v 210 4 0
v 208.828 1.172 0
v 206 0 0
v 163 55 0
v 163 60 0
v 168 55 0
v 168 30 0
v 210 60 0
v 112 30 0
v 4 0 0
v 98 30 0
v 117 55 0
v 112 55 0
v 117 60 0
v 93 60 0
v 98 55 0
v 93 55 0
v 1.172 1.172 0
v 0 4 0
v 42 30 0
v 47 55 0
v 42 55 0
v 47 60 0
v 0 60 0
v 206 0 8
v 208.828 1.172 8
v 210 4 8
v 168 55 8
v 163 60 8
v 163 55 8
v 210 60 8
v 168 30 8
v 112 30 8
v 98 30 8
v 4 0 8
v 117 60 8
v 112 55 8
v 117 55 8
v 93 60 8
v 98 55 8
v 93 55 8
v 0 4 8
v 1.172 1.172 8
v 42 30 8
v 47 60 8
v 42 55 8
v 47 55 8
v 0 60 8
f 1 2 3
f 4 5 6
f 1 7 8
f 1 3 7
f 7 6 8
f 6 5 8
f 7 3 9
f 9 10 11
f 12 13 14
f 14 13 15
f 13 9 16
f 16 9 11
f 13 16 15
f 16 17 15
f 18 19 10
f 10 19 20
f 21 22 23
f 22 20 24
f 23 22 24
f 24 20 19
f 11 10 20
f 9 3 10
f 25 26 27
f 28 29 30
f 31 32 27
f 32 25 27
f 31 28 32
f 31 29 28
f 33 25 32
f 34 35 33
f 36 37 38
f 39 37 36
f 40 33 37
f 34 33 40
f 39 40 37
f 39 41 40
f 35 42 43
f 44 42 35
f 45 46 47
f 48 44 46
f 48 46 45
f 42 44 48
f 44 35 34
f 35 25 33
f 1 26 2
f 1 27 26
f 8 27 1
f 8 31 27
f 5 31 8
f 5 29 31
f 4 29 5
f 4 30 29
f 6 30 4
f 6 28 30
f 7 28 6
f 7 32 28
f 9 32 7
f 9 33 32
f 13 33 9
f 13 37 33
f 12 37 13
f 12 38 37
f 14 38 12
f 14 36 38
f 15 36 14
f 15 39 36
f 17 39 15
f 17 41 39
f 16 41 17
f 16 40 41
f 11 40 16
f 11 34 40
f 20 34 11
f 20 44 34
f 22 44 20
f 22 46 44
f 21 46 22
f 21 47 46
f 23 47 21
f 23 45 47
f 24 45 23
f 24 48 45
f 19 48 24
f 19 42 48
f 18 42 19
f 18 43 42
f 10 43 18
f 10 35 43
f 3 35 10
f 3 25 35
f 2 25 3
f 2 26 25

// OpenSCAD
$fn = 32;

// ----------------------------------------------------------------------
// Oversize slot bar: 210 mm bar with 2 oversize windows
// ----------------------------------------------------------------------

// --- parameters (mm) ---
profile_height = 8;       // extrusion height
profile_points = 24;      // points of the closed outline

profile = [[0, 4], [1.172, 1.172], [4, 0], [206, 0], [208.828, 1.172], [210, 4], [210, 60], [163, 60], [163, 55], [168, 55], [168, 30], [112, 30], [112, 55], [117, 55], [117, 60], [93, 60], [93, 55], [98, 55], [98, 30], [42, 30], [42, 55], [47, 55], [47, 60], [0, 60]];  // single closed polygon, 24 points, counter clockwise

// --- the one profile operation ---
linear_extrude(height = profile_height) polygon(points = profile);
